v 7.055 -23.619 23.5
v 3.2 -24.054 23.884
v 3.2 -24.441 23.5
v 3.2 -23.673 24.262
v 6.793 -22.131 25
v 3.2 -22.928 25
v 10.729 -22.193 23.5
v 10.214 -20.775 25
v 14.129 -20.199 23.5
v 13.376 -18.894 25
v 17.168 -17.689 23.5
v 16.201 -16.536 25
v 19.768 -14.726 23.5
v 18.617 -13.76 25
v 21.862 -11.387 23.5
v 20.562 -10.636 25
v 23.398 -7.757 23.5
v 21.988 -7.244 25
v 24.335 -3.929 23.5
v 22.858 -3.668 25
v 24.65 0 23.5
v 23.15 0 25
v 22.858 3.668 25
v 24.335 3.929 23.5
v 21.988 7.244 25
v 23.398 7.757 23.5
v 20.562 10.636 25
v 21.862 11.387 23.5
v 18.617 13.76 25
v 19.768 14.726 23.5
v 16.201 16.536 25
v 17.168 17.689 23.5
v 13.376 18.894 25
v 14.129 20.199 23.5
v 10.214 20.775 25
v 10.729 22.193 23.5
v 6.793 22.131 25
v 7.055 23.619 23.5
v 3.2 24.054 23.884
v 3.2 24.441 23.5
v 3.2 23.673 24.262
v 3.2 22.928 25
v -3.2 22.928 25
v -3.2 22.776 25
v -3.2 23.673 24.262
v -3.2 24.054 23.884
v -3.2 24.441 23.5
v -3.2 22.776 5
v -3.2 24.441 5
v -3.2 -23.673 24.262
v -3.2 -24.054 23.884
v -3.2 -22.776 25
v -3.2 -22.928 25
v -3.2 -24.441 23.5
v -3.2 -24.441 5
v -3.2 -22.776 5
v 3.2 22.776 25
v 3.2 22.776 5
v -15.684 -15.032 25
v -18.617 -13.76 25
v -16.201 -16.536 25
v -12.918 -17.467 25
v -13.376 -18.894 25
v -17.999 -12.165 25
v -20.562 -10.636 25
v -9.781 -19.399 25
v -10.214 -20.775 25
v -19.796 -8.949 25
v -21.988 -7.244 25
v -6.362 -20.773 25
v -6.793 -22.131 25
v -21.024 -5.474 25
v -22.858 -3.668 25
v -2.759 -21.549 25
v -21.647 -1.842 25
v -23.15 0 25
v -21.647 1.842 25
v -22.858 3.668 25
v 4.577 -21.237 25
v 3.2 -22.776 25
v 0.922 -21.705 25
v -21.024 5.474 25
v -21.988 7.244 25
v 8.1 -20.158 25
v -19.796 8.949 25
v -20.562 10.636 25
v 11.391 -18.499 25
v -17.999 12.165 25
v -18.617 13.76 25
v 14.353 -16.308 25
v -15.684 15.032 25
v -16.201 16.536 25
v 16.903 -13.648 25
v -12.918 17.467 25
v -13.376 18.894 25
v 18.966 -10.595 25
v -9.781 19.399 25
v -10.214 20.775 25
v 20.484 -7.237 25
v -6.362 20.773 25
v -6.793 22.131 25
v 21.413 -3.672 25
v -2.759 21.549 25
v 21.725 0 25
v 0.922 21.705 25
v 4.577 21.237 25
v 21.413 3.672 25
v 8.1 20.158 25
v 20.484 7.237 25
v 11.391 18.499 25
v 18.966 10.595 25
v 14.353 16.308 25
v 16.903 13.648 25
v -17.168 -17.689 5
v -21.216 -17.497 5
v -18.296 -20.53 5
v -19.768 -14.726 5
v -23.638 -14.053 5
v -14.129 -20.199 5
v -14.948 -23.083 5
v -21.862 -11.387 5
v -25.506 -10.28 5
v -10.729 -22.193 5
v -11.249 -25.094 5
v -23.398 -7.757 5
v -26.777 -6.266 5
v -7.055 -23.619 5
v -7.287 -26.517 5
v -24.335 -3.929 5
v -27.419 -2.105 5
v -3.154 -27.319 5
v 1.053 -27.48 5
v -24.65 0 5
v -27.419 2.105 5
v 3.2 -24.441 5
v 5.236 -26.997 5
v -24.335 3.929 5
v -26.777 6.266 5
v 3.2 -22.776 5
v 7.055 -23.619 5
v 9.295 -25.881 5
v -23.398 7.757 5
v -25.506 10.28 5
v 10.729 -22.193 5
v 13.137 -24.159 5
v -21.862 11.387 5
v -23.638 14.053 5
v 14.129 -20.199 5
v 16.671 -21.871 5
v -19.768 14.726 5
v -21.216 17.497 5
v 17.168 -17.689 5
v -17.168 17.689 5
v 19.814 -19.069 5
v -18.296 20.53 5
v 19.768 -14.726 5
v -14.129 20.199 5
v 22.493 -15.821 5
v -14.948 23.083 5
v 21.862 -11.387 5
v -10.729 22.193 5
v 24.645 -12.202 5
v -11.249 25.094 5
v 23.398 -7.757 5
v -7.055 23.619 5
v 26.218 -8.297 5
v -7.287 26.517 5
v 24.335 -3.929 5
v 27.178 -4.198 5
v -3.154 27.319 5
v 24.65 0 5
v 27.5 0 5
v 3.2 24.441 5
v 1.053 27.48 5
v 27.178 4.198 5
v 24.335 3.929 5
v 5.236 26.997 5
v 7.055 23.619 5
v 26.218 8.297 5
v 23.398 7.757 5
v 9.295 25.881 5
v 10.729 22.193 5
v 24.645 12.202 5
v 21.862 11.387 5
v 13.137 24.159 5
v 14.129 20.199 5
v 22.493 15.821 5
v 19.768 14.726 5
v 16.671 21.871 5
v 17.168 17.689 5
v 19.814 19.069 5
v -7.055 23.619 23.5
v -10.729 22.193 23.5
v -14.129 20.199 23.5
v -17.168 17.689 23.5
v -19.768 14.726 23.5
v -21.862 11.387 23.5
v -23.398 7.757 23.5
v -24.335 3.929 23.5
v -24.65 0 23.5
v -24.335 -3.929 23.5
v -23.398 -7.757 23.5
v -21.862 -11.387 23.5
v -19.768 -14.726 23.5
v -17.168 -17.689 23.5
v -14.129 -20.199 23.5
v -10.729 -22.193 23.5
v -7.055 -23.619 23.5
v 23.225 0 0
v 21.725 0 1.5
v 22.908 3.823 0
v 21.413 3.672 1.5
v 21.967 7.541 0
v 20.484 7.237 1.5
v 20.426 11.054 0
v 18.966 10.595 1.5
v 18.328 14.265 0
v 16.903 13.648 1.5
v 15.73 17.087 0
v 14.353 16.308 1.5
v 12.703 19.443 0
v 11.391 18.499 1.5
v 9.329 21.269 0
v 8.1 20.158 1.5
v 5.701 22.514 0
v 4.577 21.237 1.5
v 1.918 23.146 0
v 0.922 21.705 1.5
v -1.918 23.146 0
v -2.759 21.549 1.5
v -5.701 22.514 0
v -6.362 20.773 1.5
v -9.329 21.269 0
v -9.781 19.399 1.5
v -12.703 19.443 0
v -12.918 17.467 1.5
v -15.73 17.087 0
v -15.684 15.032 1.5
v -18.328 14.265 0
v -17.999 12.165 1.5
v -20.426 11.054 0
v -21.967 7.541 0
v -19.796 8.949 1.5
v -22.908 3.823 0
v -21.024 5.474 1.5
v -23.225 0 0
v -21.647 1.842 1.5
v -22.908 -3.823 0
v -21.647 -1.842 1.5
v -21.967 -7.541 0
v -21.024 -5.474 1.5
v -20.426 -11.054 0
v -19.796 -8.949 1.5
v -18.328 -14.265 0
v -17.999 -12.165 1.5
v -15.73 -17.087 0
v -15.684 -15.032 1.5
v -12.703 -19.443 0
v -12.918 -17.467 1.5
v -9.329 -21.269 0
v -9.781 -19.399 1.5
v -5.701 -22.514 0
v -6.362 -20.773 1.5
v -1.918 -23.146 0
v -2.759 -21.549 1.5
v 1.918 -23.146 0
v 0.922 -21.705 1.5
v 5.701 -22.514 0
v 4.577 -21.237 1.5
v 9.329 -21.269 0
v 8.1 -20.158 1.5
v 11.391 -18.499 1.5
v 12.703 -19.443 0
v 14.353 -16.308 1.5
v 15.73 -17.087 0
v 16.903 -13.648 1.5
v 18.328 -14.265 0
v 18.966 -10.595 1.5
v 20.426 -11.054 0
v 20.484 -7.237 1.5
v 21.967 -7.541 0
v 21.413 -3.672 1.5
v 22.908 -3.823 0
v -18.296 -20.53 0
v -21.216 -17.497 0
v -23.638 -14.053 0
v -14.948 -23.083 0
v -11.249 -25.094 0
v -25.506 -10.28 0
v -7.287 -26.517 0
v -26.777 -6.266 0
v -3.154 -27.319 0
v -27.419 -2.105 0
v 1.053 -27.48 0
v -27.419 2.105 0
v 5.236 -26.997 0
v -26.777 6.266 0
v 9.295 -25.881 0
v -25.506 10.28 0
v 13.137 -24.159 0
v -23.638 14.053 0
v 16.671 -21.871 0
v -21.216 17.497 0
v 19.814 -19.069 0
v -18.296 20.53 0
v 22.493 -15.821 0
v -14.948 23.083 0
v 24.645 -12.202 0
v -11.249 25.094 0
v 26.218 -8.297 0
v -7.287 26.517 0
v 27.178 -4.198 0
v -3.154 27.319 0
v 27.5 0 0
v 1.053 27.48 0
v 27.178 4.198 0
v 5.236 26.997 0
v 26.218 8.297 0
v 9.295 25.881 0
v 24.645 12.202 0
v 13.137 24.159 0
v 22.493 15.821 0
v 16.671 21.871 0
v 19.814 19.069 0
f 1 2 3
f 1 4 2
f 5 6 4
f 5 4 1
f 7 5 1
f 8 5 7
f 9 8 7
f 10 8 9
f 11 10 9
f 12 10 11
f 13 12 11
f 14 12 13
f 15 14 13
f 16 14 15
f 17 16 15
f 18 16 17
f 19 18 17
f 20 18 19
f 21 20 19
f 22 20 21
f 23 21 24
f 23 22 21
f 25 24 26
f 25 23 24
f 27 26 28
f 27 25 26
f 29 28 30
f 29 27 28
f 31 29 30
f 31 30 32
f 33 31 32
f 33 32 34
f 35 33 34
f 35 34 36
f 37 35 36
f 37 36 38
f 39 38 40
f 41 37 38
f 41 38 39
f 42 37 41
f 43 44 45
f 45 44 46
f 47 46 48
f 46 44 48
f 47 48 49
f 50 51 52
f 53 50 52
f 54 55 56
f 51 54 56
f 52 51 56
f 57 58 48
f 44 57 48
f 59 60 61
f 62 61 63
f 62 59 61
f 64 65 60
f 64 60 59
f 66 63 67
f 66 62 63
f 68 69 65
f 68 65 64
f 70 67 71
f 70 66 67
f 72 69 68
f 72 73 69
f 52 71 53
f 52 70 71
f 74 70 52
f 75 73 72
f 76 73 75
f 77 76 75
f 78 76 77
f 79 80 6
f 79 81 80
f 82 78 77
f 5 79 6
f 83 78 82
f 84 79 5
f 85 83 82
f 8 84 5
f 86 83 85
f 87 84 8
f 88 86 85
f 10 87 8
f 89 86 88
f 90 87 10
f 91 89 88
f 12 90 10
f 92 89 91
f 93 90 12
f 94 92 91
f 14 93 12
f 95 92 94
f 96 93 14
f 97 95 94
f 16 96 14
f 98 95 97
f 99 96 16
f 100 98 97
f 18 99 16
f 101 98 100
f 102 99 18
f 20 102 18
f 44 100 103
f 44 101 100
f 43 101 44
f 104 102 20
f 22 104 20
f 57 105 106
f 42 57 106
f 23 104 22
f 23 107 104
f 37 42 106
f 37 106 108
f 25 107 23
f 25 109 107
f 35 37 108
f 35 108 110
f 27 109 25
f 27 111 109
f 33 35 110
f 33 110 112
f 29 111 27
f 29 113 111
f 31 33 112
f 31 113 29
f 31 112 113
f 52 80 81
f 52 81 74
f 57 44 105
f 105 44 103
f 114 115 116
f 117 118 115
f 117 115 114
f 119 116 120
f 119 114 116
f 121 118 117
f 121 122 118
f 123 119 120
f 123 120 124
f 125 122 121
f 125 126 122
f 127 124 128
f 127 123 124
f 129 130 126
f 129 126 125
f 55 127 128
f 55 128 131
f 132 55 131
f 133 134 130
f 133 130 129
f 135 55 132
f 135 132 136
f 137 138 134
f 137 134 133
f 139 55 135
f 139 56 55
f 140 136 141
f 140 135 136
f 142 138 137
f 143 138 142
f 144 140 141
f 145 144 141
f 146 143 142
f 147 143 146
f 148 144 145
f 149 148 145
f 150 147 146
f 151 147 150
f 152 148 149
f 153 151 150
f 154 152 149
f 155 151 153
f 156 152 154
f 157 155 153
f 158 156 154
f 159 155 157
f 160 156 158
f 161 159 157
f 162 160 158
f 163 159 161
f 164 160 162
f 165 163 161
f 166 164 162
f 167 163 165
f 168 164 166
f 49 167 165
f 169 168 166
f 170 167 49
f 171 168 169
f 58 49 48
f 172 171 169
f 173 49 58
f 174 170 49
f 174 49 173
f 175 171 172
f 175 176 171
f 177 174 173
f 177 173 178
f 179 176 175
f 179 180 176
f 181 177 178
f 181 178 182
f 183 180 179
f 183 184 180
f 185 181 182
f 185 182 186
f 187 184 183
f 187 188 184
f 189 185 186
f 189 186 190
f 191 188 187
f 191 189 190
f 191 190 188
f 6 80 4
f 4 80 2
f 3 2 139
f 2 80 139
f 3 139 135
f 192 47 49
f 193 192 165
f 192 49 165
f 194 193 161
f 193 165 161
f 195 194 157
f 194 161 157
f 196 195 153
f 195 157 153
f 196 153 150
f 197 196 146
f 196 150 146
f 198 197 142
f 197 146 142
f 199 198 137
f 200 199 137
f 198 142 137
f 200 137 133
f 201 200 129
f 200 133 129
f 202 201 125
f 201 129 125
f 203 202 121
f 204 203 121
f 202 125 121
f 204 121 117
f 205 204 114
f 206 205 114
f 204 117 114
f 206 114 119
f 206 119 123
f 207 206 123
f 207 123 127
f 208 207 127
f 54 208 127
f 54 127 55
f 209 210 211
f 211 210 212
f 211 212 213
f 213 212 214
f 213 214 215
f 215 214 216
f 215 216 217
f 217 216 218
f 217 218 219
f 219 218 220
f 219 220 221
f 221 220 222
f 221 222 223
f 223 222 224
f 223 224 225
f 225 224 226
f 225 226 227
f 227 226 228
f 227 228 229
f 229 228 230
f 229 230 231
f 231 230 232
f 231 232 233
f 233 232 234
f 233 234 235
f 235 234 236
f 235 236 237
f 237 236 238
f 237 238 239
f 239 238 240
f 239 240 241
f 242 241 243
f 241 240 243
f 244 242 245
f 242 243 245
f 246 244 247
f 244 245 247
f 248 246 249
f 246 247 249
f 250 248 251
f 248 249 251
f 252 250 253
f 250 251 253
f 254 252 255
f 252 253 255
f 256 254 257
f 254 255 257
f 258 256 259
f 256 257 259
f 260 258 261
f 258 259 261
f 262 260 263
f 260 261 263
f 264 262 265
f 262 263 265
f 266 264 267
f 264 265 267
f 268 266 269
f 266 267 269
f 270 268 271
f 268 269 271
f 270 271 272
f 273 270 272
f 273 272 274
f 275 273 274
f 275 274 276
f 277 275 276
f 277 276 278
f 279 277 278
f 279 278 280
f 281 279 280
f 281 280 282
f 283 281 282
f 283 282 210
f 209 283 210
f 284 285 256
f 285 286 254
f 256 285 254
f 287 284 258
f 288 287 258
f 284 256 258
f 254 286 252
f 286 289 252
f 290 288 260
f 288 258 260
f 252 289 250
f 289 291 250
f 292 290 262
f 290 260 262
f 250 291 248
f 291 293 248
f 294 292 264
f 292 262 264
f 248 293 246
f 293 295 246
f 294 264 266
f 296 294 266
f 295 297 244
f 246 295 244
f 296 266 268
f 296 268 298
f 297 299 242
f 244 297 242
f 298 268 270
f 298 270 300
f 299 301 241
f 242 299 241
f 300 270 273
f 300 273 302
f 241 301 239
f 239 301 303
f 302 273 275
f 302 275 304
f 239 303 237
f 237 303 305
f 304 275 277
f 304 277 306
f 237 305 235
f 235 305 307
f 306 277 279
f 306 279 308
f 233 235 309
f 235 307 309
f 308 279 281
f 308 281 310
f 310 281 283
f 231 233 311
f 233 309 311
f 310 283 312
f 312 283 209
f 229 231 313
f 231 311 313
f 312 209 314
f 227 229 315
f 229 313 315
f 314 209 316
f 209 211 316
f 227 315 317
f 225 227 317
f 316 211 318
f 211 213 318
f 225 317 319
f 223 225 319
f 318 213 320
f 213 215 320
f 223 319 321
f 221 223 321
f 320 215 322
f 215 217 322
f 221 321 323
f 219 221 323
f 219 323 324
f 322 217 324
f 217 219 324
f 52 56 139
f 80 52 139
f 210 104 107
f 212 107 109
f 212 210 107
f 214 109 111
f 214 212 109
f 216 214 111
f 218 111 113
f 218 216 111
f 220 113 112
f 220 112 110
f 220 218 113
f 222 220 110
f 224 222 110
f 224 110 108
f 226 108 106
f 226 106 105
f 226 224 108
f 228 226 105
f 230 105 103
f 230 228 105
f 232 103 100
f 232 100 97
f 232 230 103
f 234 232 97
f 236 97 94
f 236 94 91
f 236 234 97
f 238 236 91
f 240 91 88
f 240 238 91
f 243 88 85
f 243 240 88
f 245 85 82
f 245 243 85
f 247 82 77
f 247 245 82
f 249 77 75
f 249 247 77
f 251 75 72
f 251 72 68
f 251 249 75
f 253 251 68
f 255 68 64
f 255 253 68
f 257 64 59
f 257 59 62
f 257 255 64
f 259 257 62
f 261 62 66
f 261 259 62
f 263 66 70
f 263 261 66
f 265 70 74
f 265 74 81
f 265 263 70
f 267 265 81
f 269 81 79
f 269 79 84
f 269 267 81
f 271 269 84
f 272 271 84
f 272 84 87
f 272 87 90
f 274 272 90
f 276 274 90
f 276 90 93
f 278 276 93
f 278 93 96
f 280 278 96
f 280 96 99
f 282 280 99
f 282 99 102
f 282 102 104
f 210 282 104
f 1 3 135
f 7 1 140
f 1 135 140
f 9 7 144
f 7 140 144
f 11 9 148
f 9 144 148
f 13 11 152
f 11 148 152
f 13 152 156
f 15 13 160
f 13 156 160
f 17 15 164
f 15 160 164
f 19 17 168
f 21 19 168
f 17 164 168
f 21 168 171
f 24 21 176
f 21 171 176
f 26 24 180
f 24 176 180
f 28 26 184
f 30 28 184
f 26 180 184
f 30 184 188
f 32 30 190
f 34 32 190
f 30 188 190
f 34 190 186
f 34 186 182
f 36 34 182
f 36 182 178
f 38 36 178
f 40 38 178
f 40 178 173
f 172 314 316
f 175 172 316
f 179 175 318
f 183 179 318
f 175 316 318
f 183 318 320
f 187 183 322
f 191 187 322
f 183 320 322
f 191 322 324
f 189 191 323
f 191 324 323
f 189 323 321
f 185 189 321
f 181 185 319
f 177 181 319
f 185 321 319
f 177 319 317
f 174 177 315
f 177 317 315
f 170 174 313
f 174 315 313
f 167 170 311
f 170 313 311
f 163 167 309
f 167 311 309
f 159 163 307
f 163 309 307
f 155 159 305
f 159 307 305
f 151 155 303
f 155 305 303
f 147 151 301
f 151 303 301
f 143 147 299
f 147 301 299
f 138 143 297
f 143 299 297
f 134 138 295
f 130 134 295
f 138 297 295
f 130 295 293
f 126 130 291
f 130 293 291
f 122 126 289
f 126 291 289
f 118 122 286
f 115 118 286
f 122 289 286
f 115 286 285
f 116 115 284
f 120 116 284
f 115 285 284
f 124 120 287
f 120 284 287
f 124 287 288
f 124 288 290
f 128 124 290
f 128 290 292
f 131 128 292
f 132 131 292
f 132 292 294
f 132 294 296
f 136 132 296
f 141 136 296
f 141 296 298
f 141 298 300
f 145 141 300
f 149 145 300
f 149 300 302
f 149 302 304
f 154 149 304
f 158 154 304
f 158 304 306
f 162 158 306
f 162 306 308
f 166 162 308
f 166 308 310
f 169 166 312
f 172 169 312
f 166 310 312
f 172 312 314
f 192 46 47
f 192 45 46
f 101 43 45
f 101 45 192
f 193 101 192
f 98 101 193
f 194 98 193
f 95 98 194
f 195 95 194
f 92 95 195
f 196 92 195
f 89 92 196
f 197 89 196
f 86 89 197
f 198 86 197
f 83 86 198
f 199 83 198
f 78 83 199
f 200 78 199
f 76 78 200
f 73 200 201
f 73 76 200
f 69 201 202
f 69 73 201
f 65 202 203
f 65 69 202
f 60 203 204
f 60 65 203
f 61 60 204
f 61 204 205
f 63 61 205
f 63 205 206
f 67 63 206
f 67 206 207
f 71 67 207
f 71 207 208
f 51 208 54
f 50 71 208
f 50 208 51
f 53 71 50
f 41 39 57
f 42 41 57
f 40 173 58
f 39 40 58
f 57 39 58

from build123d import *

# Parameters (mm, degrees)
F0_R     = 21.725
F1_DEPTH = 25
F0_R_2   = 27.5
F2_DEPTH = 5
F3_SIZE  = 1.5


# Not quite as in the source:
# - a feature names something its author has since deleted; it is built from what else it names


with BuildPart() as f1:
    # F0 (on Top) → F1 (new body)
    with BuildSketch(Plane.XY):
        with BuildLine():
            Line((-3.2, 22.7763034753), (-3.2, 24.4414095338))
            ThreePointArc((-3.2, 24.4414095338), (-24.65, 0), (-3.2, -24.4414095338))
            Line((-3.2, -24.4414095338), (-3.2, -22.7763034753))
            Line((-3.2, -22.7763034753), (3.2, -22.7763034753))
            Line((3.2, -22.7763034753), (3.2, -24.4414095338))
            ThreePointArc((3.2, -24.4414095338), (24.65, 0), (3.2, 24.4414095338))
            Line((3.2, 24.4414095338), (3.2, 22.7763034753))
            Line((3.2, 22.7763034753), (-3.2, 22.7763034753))
        make_face()
        Circle(F0_R, mode=Mode.SUBTRACT)
    extrude(amount=F1_DEPTH)

    # F0 (on Top) → F2 (join)
    with BuildSketch(Plane.XY):
        Circle(F0_R_2)
        with BuildLine():
            ThreePointArc((-3.2, -24.4414095338), (-24.65, 0), (-3.2, 24.4414095338))
            Line((-3.2, 24.4414095338), (-3.2, 22.7763034753))
            Line((-3.2, 22.7763034753), (3.2, 22.7763034753))
            Line((3.2, 22.7763034753), (3.2, 24.4414095338))
            ThreePointArc((3.2, 24.4414095338), (24.65, 0), (3.2, -24.4414095338))
            Line((3.2, -24.4414095338), (3.2, -22.7763034753))
            Line((3.2, -22.7763034753), (-3.2, -22.7763034753))
            Line((-3.2, -22.7763034753), (-3.2, -24.4414095338))
        make_face(mode=Mode.SUBTRACT)
    extrude(amount=F2_DEPTH)

    # F3
    f3_edges = [f1.edges().sort_by_distance(p)[0] for p in [
        (-24.65, 0, 25),
        (24.65, 0, 25),
        (-21.725, 0, 0),
    ]]
    chamfer(f3_edges, length=F3_SIZE)


solid = f1.part
